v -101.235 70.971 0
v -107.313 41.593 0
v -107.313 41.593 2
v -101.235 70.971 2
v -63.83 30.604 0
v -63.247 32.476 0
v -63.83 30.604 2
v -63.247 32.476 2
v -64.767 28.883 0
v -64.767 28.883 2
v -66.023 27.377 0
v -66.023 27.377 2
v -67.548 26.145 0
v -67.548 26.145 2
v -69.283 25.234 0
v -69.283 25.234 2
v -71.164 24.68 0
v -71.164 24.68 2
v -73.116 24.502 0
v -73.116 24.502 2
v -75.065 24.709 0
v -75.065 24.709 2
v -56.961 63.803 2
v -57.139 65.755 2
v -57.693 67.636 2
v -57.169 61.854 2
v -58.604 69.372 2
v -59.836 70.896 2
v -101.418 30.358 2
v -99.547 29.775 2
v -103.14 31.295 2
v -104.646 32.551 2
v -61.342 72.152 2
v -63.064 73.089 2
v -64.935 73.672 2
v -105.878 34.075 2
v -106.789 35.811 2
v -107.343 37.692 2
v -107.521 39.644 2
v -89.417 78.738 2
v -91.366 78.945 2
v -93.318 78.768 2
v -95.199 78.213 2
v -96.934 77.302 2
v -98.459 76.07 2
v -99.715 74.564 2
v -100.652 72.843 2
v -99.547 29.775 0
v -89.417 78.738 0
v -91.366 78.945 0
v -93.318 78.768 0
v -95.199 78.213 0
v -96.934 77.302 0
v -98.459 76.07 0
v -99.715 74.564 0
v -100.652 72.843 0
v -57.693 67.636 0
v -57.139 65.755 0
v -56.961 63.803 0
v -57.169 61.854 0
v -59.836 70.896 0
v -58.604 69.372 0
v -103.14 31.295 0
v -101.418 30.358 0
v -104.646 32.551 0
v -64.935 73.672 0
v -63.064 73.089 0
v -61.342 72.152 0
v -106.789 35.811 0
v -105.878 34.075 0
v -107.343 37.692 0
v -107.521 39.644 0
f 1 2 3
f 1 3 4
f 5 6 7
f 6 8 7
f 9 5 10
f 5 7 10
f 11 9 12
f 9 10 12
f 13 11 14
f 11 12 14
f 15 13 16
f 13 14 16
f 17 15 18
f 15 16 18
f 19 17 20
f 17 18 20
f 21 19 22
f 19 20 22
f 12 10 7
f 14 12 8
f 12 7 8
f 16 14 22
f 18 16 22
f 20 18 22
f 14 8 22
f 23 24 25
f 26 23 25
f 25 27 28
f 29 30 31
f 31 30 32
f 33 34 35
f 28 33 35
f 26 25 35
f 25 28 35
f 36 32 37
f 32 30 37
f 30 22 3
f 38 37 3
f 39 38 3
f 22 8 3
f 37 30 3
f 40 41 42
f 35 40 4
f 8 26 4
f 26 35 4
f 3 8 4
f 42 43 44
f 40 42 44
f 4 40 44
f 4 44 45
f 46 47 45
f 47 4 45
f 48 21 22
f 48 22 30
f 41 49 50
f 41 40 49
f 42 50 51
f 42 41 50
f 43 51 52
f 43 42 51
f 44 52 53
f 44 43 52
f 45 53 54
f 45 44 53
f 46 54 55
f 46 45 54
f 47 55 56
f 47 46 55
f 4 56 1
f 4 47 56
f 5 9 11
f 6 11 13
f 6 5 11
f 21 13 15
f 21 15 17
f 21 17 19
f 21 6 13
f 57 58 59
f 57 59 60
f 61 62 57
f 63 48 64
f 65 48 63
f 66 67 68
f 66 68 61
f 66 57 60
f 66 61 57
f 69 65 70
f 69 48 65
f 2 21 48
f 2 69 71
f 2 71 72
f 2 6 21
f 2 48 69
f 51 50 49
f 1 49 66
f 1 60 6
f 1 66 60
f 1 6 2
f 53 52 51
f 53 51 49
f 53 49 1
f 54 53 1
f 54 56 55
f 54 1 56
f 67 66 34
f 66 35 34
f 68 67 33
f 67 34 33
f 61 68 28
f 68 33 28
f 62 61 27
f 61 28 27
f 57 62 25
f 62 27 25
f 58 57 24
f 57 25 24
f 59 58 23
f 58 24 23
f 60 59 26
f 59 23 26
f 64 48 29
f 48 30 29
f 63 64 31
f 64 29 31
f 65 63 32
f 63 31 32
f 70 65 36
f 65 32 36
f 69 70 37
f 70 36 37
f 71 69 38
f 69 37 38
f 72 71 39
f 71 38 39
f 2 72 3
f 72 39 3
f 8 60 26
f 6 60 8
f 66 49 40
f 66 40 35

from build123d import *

# Parameters (mm, degrees)
BOSS_EXTRU_1_DEPTH = 2
CONG_1_R           = 10


with BuildPart() as part:
    # Esquisse1 → Boss.-Extru.1 (new body)
    with BuildSketch(Plane.XY):
        Polygon((-99.209210776, 80.763658909), (-55.142491898, 71.646406727), (-65.2727721, 22.683385752), (-109.339490978, 31.800637933), align=None)
    extrude(amount=BOSS_EXTRU_1_DEPTH)

    # Congé1
    cong_1_edges = [part.edges().sort_by_distance(p)[0] for p in [
        (-99.209210776, 80.763658909, 1),
        (-55.142491898, 71.646406727, 1),
        (-65.2727721, 22.683385752, 1),
        (-109.339490978, 31.800637933, 1),
    ]]
    fillet(cong_1_edges, radius=CONG_1_R)


solid = part.part
